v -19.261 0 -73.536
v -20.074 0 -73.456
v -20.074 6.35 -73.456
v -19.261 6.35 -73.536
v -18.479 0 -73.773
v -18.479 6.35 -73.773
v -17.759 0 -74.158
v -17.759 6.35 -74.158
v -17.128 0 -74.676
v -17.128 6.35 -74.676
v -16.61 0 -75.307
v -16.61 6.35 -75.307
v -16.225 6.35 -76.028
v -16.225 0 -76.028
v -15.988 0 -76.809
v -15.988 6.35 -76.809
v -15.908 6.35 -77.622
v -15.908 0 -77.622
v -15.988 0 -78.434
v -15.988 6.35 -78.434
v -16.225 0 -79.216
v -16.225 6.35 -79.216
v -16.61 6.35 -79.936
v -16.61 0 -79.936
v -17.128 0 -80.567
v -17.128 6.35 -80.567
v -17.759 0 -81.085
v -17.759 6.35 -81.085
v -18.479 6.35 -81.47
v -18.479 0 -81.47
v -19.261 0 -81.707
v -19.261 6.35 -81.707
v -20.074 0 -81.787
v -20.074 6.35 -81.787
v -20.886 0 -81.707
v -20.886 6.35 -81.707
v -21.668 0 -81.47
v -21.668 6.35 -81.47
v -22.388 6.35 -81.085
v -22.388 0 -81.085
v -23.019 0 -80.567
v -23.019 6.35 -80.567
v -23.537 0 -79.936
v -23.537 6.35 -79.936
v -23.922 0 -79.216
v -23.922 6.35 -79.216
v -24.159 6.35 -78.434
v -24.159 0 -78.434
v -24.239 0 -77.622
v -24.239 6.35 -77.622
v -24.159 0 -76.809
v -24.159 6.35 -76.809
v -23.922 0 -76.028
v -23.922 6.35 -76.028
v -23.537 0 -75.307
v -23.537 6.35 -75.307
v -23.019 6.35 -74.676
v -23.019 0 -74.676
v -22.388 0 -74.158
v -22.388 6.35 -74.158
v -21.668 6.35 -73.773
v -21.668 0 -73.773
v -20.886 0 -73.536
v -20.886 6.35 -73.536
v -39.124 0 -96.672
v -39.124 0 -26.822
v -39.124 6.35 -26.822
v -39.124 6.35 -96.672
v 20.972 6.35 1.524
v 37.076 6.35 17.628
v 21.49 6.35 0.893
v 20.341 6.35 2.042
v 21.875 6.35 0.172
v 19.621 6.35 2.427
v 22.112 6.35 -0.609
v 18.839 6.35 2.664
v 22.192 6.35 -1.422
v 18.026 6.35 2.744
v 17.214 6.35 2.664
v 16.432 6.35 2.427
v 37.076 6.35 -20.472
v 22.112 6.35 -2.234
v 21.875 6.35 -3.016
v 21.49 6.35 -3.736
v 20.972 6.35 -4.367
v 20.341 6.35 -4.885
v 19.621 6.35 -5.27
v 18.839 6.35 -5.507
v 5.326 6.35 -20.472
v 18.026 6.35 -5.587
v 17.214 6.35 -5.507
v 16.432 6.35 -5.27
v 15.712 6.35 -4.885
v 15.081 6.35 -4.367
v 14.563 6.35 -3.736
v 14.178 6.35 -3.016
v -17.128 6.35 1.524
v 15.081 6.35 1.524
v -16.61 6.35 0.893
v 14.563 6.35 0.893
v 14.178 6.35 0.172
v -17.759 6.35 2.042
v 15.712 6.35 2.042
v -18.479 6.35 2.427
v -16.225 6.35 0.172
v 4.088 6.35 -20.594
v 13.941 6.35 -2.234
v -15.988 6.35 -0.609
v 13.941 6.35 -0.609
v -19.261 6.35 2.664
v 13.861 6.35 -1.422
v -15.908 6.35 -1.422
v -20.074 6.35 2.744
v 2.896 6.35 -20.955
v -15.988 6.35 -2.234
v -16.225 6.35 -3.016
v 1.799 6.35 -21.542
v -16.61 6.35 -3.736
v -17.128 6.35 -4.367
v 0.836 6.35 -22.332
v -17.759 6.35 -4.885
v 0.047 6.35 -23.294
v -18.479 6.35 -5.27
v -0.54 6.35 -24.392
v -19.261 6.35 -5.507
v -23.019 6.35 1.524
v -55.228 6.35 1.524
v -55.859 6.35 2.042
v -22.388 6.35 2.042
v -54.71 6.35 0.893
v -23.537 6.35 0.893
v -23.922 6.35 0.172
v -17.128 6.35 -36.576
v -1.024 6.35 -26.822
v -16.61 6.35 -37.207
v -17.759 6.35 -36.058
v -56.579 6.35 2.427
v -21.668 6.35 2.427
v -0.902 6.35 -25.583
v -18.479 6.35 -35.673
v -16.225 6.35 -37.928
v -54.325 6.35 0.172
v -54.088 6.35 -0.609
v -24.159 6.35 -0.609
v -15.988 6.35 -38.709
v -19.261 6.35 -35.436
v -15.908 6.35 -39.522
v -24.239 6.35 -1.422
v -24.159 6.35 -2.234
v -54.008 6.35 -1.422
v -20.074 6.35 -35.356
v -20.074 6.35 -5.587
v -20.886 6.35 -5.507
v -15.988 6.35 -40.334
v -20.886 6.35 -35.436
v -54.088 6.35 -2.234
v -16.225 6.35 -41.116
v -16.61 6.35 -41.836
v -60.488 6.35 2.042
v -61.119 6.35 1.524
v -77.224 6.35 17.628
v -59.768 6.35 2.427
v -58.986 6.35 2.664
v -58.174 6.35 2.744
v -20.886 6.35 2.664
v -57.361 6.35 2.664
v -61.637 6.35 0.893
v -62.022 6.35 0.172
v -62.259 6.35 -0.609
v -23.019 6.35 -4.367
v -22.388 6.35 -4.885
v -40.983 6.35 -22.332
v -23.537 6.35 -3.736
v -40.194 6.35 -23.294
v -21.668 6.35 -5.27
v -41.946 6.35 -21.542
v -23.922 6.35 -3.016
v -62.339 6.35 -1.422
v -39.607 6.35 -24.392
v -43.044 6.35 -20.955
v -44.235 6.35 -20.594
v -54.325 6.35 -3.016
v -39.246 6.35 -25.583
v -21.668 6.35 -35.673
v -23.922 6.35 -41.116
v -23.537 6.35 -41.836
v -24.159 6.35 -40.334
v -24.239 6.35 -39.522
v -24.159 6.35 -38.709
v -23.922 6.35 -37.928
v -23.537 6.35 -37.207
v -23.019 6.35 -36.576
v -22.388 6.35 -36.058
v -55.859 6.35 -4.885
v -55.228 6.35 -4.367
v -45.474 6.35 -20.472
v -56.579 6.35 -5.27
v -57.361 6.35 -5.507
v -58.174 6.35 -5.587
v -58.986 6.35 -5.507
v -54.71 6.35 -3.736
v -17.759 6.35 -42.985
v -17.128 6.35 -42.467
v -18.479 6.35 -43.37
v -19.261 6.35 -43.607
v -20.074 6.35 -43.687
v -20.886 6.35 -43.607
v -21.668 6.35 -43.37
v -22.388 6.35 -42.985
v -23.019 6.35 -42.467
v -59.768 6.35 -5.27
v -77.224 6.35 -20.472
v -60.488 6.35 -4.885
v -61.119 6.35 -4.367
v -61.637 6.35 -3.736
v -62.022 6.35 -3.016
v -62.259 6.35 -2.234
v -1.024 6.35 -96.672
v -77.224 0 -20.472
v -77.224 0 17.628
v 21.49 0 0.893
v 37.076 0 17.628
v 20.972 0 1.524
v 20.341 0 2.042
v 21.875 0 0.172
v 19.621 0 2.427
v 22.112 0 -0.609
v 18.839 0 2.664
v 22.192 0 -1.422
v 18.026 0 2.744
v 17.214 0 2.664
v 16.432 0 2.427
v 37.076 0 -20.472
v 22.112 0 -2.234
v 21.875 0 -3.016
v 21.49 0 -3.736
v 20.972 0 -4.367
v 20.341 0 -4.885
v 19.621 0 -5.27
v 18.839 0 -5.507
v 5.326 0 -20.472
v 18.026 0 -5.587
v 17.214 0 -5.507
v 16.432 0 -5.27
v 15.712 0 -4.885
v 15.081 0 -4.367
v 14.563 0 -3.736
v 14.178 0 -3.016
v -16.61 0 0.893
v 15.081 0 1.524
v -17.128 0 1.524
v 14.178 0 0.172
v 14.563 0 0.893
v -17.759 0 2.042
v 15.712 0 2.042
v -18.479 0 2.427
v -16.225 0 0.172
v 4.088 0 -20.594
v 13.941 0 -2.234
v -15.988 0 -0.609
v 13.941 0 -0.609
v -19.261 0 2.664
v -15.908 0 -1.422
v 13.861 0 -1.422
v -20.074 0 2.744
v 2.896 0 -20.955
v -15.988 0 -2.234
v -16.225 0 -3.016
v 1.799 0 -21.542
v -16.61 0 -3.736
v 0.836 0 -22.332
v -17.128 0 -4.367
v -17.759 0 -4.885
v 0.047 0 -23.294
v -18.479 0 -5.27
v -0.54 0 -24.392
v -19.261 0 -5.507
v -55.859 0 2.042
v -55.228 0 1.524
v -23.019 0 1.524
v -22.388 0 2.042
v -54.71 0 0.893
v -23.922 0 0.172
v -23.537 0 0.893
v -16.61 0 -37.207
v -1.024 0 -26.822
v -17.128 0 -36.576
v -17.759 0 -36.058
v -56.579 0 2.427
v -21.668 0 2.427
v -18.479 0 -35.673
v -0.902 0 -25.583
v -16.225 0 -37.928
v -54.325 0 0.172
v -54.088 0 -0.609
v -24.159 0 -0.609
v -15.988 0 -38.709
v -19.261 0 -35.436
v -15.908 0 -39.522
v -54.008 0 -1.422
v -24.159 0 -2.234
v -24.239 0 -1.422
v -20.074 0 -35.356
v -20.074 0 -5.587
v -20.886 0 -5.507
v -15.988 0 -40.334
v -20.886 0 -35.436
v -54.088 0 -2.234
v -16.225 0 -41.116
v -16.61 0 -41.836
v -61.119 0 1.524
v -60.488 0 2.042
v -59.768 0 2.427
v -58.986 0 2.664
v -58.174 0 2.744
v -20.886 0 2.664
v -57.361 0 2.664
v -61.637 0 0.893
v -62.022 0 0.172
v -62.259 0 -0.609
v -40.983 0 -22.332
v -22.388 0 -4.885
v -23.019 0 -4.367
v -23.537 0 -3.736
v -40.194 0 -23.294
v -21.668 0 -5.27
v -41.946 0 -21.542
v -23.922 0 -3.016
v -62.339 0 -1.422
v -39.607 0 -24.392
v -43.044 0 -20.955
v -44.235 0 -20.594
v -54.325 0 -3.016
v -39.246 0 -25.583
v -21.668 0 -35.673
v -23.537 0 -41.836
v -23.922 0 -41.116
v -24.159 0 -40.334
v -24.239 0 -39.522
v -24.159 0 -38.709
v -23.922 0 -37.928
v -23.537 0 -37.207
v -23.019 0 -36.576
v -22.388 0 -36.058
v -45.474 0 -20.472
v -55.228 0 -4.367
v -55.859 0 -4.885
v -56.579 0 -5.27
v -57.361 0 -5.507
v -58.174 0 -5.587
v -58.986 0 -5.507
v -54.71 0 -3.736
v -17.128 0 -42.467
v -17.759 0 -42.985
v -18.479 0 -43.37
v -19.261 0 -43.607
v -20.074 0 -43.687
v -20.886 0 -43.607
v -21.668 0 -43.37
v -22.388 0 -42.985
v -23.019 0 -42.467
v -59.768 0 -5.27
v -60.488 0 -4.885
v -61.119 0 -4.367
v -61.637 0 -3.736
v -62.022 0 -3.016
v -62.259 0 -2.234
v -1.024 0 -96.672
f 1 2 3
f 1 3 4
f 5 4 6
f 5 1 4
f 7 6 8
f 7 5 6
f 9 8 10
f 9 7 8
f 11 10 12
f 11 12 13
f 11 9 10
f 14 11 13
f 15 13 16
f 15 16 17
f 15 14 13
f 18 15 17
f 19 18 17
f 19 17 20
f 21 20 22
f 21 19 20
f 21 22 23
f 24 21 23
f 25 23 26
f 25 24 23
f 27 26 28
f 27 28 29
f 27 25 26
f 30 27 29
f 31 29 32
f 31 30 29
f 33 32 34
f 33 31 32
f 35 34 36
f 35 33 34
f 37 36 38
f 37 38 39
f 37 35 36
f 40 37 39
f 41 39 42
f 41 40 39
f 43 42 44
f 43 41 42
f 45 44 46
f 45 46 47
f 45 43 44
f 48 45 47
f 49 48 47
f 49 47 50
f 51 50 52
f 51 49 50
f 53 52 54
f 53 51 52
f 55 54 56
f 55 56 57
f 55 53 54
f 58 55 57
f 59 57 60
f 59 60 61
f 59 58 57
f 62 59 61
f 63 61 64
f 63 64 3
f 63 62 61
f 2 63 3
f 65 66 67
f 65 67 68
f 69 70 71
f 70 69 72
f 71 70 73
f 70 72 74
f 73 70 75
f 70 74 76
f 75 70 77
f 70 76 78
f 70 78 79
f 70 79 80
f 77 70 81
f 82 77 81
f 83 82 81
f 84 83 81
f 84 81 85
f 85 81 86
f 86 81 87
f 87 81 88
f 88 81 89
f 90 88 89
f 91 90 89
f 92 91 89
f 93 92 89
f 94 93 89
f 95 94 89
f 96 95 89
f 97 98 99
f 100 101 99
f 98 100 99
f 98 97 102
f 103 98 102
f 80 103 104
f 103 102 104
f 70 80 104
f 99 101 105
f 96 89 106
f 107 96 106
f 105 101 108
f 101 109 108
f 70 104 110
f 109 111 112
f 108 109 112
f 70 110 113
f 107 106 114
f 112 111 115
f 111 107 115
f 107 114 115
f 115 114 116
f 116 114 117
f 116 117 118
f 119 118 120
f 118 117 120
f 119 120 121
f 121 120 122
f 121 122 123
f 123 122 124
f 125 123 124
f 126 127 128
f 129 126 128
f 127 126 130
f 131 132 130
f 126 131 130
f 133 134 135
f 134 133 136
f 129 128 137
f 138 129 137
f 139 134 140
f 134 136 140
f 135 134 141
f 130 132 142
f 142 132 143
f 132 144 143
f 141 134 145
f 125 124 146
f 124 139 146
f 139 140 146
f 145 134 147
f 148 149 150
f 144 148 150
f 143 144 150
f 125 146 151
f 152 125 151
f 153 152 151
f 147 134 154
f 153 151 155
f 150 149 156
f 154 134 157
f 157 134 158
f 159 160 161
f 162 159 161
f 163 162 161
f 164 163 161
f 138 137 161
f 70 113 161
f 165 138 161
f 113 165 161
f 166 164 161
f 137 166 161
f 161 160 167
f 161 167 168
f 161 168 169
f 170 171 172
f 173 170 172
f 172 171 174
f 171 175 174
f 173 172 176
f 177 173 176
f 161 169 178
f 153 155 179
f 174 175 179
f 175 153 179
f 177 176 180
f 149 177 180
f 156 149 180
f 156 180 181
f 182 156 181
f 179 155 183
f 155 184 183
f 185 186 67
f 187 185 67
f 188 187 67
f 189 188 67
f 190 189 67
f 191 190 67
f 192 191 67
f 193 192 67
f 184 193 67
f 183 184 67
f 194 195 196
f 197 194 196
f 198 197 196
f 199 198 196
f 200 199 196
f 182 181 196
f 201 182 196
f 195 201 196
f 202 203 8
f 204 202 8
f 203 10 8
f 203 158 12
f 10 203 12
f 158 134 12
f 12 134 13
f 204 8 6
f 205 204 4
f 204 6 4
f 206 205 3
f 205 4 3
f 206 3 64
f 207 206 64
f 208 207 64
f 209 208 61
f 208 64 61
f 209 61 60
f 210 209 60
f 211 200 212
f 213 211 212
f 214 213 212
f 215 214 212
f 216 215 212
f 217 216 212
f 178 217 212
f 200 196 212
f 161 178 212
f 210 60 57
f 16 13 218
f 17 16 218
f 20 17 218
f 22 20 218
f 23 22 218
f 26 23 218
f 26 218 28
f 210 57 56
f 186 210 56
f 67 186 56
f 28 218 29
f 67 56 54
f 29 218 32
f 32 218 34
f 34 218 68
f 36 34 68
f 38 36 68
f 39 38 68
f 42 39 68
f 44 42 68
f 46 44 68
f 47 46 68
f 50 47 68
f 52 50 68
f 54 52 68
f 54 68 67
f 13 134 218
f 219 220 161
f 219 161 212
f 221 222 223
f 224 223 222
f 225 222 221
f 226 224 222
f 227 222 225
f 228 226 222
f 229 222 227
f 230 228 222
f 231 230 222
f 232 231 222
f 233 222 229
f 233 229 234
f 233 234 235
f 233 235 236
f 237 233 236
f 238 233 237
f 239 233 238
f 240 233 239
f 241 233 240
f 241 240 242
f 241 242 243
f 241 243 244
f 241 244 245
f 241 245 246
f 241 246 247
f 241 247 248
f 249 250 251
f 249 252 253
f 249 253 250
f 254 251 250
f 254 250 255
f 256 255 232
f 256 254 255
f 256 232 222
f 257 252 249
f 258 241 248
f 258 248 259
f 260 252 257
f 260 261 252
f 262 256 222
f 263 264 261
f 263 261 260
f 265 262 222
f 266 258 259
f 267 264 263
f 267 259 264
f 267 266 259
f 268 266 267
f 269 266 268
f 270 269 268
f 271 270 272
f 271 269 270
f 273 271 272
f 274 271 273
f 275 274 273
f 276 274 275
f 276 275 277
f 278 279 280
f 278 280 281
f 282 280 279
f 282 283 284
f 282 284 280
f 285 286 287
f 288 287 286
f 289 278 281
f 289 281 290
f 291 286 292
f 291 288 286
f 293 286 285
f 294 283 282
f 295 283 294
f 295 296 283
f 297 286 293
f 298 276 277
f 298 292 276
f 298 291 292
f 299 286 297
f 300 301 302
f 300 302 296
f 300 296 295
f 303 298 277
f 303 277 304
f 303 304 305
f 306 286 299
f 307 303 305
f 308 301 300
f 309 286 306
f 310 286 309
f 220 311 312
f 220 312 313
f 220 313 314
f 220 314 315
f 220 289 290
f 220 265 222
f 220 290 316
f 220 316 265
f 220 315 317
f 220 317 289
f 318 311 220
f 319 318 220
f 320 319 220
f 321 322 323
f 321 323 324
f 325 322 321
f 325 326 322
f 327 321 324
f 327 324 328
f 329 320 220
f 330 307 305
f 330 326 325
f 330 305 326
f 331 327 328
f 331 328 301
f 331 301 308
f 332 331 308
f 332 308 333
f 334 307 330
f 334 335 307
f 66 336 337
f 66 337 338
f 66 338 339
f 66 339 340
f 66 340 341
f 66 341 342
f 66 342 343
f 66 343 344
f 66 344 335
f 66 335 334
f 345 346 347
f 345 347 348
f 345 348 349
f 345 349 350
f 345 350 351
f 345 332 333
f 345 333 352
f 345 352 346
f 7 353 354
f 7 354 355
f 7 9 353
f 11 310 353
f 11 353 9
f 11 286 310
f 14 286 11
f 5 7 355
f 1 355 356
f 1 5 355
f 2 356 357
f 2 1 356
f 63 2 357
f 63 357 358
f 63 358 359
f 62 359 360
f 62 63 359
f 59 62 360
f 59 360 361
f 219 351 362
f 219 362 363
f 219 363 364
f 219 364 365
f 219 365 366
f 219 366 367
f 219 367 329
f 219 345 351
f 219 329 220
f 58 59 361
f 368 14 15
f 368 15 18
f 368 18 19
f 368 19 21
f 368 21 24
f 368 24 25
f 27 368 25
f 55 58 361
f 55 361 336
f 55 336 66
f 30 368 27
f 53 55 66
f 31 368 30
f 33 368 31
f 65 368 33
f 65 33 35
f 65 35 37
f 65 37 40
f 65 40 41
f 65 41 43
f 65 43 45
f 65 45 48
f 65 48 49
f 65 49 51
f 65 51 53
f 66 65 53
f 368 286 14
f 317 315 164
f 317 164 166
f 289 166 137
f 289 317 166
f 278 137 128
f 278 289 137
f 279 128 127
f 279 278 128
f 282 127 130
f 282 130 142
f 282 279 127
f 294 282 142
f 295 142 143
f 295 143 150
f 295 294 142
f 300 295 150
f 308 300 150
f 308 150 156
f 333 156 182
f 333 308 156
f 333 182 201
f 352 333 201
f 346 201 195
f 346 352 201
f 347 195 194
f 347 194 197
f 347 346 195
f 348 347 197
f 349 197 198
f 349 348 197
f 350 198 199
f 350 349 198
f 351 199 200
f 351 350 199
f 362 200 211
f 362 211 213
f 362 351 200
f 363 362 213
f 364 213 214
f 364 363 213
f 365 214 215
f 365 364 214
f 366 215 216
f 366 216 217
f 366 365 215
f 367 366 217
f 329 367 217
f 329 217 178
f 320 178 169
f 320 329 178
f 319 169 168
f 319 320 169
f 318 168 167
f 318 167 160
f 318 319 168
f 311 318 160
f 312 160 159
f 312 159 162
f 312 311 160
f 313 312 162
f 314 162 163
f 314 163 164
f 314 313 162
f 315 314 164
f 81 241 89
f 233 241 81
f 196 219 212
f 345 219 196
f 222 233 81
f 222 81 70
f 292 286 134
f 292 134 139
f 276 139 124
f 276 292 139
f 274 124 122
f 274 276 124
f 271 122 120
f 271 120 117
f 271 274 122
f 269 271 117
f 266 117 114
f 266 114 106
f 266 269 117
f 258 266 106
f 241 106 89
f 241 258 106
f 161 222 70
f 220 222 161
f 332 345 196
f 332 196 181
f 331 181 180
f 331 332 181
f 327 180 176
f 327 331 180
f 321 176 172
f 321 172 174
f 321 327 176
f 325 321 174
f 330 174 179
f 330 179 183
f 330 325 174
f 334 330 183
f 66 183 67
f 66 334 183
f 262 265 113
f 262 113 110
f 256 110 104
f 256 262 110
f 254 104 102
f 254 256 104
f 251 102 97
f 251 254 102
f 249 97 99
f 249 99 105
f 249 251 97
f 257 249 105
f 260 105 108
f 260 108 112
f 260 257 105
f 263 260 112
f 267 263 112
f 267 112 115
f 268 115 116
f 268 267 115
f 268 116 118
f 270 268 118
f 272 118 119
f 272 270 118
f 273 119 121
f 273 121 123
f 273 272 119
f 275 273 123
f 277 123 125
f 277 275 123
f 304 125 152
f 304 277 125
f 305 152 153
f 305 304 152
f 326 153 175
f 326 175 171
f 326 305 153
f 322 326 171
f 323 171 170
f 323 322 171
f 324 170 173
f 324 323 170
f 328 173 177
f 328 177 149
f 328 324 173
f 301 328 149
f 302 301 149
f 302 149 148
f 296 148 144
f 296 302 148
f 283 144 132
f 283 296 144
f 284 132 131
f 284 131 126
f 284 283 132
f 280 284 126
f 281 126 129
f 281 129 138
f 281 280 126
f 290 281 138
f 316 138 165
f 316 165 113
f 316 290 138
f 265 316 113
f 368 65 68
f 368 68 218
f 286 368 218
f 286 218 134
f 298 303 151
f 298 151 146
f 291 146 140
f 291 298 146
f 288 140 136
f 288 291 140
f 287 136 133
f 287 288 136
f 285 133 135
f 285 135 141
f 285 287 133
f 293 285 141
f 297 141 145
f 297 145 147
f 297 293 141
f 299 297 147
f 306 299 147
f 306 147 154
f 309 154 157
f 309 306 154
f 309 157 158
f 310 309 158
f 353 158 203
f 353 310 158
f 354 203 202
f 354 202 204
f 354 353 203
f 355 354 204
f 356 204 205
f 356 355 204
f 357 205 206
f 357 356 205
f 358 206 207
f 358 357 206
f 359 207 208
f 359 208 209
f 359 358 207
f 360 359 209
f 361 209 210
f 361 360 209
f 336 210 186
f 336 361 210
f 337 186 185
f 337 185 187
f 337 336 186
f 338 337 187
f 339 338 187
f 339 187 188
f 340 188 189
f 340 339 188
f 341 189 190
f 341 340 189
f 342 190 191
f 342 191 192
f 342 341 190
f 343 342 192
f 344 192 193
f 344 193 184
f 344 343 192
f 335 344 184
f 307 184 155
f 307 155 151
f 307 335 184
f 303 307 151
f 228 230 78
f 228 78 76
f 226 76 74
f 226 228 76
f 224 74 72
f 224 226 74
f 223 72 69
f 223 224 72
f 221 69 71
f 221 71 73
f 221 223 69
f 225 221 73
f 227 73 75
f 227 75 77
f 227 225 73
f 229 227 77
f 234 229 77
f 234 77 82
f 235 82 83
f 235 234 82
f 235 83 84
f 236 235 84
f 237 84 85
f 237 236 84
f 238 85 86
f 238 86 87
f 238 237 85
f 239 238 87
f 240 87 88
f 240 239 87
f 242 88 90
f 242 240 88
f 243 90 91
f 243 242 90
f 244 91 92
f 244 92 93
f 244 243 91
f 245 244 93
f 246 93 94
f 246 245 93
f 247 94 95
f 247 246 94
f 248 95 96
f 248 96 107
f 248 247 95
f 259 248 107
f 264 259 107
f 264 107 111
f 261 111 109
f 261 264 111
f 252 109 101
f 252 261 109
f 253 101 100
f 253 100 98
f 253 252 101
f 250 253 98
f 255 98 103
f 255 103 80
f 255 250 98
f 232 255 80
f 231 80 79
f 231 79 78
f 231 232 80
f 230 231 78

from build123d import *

# Parameters (mm, degrees)
SKETCH1_R           = 4.1656
BOSS_EXTRUDE2_DEPTH = 6.35


with BuildPart() as part:
    # Sketch1 → Boss-Extrude2 (new body)
    with BuildSketch(Plane(origin=(0, 0, 0), x_dir=(1, 0, 0), z_dir=(0, 1, 0))):
        with BuildLine():
            Line((-77.22358209, -17.628358209), (-77.22358209, 20.471641791))
            Line((-77.22358209, 20.471641791), (-45.47358209, 20.471641791))
            ThreePointArc((-45.47358209, 20.471641791), (-40.983454029, 22.331513731), (-39.12358209, 26.821641791))
            Line((-39.12358209, 26.821641791), (-39.12358209, 96.671641791))
            Line((-39.12358209, 96.671641791), (-1.02358209, 96.671641791))
            Line((-1.02358209, 96.671641791), (-1.02358209, 26.821641791))
            ThreePointArc((-1.02358209, 26.821641791), (0.83628985, 22.331513731), (5.32641791, 20.471641791))
            Line((5.32641791, 20.471641791), (37.07641791, 20.471641791))
            Line((37.07641791, 20.471641791), (37.07641791, -17.628358209))
            Line((37.07641791, -17.628358209), (-77.22358209, -17.628358209))
        make_face()
        with Locations(Location((-20.07358209, 77.621641791, 0), (0, 0, 270))):
            Circle(SKETCH1_R, mode=Mode.SUBTRACT)
        with Locations(Location((-20.07358209, 39.521641791, 0), (0, 0, 270))):
            Circle(SKETCH1_R, mode=Mode.SUBTRACT)
        with Locations(Location((-20.07358209, 1.421641791, 0), (0, 0, 270))):
            Circle(SKETCH1_R, mode=Mode.SUBTRACT)
        with Locations(Location((18.02641791, 1.421641791, 0), (0, 0, 270))):
            Circle(SKETCH1_R, mode=Mode.SUBTRACT)
        with Locations(Location((-58.17358209, 1.421641791, 0), (0, 0, 270))):
            Circle(SKETCH1_R, mode=Mode.SUBTRACT)
    extrude(amount=BOSS_EXTRUDE2_DEPTH)


solid = part.part
